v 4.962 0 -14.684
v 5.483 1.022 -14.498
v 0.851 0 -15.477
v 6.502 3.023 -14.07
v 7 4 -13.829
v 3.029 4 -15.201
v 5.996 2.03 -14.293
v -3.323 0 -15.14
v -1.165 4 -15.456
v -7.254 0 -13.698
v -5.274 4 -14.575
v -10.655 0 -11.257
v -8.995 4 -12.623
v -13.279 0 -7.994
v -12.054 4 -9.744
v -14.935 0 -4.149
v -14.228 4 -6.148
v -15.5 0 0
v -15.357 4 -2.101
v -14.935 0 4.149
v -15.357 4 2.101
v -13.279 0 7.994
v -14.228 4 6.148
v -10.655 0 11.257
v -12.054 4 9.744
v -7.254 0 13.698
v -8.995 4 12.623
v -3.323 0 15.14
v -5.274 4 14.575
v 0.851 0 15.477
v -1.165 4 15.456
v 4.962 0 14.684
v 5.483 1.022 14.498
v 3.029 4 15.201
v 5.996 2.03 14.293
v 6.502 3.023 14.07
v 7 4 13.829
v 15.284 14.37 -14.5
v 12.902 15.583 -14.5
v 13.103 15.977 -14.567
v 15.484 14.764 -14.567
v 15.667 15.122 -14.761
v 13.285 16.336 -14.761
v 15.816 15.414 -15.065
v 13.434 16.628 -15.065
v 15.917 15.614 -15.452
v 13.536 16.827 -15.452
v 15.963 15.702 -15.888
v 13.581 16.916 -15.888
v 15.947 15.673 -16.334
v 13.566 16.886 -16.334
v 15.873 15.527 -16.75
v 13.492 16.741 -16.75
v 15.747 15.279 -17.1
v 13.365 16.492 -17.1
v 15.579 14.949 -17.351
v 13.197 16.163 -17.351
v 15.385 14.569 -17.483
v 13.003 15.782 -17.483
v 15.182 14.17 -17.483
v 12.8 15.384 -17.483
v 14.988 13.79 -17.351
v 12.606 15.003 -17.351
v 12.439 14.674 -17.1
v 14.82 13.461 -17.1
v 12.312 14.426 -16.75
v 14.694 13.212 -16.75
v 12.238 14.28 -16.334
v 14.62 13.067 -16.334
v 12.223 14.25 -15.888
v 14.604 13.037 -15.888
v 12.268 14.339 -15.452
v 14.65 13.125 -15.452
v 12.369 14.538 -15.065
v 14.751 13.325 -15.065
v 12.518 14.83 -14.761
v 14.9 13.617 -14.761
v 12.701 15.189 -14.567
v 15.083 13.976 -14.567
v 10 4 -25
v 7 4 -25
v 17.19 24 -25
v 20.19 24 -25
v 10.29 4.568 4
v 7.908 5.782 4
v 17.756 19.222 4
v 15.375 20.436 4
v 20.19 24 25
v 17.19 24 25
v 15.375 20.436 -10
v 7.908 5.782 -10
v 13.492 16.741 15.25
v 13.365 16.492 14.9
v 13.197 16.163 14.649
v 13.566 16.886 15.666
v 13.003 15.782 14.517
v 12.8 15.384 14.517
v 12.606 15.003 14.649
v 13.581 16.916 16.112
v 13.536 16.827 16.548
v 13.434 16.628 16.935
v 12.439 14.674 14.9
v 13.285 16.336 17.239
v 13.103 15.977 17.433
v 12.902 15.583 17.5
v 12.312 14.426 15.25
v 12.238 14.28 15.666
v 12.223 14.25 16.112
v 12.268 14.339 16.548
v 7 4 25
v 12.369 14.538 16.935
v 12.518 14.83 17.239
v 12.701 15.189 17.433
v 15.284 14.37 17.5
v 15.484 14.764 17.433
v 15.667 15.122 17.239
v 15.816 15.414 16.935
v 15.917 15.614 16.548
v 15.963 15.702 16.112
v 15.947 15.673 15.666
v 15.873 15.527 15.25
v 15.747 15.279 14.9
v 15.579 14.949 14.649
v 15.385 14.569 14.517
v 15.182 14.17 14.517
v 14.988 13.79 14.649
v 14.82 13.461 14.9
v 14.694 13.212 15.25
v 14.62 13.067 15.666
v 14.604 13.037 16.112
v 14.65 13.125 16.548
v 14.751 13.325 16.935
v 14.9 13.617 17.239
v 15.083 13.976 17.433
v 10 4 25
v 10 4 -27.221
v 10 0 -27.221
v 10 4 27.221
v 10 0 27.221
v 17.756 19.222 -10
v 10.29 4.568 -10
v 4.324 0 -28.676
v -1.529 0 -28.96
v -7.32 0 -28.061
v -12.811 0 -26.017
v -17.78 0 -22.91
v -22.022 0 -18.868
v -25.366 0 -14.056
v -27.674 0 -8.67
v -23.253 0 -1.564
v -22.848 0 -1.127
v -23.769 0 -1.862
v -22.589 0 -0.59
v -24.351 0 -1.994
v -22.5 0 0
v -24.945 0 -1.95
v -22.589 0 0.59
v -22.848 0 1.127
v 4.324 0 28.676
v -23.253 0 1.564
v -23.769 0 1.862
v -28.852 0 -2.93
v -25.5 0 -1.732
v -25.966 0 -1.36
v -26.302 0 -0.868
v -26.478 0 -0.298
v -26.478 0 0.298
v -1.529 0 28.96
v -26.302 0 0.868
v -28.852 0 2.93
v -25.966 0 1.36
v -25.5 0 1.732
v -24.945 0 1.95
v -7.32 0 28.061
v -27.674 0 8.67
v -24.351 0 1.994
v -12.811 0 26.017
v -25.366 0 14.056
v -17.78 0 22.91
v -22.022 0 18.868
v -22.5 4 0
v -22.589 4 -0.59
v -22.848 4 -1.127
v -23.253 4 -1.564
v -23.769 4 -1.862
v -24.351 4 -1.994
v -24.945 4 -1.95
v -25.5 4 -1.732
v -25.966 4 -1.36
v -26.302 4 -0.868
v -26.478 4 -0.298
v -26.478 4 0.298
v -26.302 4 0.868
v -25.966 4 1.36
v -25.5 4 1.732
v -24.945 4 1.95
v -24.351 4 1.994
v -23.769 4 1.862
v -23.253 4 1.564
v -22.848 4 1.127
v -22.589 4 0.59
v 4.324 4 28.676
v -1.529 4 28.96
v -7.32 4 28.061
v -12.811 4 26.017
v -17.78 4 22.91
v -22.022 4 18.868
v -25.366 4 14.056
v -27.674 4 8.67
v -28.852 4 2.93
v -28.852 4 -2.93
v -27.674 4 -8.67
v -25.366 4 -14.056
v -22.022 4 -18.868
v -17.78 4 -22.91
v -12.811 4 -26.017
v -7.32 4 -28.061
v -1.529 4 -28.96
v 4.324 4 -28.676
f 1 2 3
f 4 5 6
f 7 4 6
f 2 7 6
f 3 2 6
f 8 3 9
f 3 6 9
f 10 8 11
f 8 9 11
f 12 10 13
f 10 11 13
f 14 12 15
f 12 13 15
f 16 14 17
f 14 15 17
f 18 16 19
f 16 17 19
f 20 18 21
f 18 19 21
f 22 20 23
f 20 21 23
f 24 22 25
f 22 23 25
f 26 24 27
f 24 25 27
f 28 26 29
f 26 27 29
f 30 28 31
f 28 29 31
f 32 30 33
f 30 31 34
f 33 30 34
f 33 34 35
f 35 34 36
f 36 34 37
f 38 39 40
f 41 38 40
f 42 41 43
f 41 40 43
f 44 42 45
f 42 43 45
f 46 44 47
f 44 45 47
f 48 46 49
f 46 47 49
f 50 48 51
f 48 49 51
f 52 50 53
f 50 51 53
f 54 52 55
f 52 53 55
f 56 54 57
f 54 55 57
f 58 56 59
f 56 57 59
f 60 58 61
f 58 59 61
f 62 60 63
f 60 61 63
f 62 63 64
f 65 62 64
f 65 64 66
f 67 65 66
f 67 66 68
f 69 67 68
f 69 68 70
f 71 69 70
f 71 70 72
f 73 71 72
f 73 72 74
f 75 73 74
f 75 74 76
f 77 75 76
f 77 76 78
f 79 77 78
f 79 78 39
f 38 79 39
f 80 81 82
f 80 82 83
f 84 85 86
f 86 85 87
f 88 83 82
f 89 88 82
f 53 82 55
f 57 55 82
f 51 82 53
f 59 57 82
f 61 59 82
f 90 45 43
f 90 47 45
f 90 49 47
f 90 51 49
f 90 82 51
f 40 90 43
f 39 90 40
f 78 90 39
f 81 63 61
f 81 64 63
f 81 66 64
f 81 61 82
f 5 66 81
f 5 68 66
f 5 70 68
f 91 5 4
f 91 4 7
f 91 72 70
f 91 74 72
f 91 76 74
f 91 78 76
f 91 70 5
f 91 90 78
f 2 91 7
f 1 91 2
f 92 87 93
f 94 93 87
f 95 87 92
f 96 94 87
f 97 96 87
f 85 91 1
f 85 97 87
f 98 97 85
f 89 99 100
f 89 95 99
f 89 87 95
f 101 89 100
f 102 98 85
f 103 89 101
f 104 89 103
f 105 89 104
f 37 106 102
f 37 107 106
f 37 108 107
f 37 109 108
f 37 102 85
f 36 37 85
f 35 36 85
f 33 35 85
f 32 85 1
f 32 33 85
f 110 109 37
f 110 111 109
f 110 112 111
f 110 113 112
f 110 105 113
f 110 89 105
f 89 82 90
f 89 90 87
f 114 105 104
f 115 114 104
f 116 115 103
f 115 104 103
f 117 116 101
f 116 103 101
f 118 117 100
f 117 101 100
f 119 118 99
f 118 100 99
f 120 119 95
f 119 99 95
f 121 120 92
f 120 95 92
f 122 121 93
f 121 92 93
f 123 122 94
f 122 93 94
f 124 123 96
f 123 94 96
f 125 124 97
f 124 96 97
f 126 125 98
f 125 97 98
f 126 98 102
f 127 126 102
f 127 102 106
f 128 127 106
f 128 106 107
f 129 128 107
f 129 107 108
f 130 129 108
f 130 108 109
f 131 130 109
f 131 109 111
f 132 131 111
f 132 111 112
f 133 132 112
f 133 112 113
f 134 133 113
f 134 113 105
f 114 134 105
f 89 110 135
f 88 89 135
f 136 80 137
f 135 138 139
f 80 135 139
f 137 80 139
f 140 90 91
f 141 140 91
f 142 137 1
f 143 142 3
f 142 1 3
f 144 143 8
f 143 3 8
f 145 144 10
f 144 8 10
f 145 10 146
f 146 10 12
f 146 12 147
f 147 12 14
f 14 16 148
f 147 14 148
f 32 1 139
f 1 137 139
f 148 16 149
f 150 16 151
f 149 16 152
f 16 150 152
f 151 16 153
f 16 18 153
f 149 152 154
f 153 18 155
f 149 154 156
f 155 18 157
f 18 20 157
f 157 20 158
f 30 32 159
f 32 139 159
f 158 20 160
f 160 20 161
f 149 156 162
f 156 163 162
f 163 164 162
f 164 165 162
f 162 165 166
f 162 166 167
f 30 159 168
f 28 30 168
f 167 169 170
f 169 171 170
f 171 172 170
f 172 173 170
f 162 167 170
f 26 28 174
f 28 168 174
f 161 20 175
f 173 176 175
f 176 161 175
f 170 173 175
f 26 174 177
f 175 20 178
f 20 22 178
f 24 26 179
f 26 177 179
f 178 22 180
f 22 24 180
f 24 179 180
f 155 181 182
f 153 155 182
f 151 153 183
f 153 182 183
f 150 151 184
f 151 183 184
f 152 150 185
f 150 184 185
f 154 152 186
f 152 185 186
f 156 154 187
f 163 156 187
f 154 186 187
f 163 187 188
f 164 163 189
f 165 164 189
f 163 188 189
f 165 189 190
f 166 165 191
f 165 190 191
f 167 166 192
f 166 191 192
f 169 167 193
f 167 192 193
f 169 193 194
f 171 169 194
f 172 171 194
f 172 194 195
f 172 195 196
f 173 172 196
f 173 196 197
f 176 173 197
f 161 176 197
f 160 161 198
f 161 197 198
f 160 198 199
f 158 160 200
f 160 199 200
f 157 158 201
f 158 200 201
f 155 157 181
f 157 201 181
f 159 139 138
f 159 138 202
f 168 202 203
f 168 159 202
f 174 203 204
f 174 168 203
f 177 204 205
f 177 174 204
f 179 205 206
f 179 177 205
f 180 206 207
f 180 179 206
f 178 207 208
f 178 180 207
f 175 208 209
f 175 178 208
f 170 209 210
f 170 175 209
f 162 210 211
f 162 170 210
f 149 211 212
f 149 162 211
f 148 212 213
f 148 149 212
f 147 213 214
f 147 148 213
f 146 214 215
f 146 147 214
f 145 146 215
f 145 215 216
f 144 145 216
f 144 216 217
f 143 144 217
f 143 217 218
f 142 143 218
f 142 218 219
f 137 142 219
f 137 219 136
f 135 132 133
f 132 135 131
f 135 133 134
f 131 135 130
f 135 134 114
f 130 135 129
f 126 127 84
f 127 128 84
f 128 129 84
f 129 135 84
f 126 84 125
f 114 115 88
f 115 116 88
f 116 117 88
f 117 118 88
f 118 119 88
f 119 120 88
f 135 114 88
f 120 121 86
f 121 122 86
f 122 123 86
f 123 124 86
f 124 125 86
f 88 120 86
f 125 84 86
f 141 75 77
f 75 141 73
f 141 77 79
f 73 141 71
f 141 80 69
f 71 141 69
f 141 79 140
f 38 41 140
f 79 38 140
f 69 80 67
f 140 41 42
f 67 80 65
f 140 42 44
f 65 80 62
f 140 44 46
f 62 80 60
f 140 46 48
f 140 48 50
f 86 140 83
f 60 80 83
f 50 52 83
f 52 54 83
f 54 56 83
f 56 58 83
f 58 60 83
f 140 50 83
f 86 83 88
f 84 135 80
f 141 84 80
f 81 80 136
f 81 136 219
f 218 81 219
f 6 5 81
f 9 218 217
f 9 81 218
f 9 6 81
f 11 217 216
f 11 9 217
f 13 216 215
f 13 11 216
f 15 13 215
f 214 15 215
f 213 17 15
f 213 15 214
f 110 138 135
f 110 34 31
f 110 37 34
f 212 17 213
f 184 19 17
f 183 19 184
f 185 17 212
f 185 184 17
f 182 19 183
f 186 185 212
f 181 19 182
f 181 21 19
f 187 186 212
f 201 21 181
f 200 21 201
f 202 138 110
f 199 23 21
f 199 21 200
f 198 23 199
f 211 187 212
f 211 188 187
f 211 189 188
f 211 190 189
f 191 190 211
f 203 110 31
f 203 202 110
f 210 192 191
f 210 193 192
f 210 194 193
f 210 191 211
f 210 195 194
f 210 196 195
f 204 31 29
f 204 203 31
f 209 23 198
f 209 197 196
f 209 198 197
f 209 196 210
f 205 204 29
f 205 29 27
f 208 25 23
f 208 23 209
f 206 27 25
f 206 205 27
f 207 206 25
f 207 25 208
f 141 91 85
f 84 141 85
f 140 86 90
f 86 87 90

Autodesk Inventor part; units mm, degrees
ref_plane "YZ Plane" through (0, 0, 0) normal (1, 0, 0) x (0, 1, 0)
ref_plane "XZ Plane" through (0, 0, 0) normal (0, 1, 0) x (-1, 0, 0)
ref_plane "XY Plane" through (0, 0, 0) normal (0, 0, 1) x (1, 0, 0)
sketch "Sketch1" plane through (0, 0, 0) normal (0, 1, 0) x (-1, 0, 0)
  circle A0 centre (0, 0) radius 29
  dimension "d0" = 58
extrude "Extrusion1" add sketch "Sketch1" along normal blind 4
sketch "Sketch2" plane through (0, 4, 0) normal (0, 1, 0) x (1, 0, 0)
  circle A0 centre (0, 0) radius 15.5
  dimension "d3" = 31
extrude "Extrusion2" cut sketch "Sketch2" against normal through all
sketch "Sketch3" plane through (0, 4, 0) normal (0, 1, 0) x (1, 0, 0)
  circle A0 centre (-24.5, 0) radius 2
  point P0 (0, 0)
  dimension "d6" = 24.5
  dimension "d7" = 4
extrude "Extrusion3" cut sketch "Sketch3" against normal through all
sketch "Sketch4" plane through (0, 4, 0) normal (0, 1, 0) x (1, 0, 0)
  line L0 (10, -34.3438) -> (33.4765, -34.3438)
  line L1 (33.4765, -34.3438) -> (33.4765, 39.4177)
  line L2 (33.4765, 39.4177) -> (10, 39.4177)
  line L3 (10, 39.4177) -> (10, -34.3438)
  point P0 (0, 0)
  dimension "d13" = 10
extrude "Extrusion4" cut sketch "Sketch4" against normal blind 10
sketch "Sketch5" plane through (0, 0, 0) normal (0, 0, 1) x (1, 0, 0)
  line L0 (10, 4) -> (-29, 4) projected
  line L1 (10, 4) -> (20.1905, 24)
  line L2 (10, 4) -> (32.4465, 4) construction
  line L3 (20.1905, 24) -> (17.1905, 24)
  line L4 (17.1905, 24) -> (7, 4)
  line L5 (7, 4) -> (10, 4)
  line L6 (10, 0) -> (10, 4) projected
  line L7 (10, 4) -> (10, 0)
  line L8 (7, 4) -> (4.9619, 0)
  line L9 (10, 0) -> (-15.5, 0) projected
  line L10 (4.9619, 0) -> (10, 0)
  point P0 (0, 0)
  point P1 (7, 4)
  point P2 (18.6905, 24)
  dimension "d16" = 63
  dimension "d17" = 3
  dimension "d18" = 117
  dimension "d21" = 20
extrude "Extrusion5" add sketch "Sketch5" along normal mid plane 50 contours L0 L4 L3 L1
sketch "Sketch6" plane through (7, 4, -25) normal (-0.891, 0.454, 0) x (0, 0, 1)
  line L0 (11.1707, 0) -> (38.8293, 0) projected
  line L1 (15, 2) -> (29, 2)
  line L2 (29, 2) -> (29, 18.4465)
  line L3 (29, 18.4465) -> (15, 18.4465)
  line L4 (15, 18.4465) -> (15, 2)
  line L5 (50, 22.4465) -> (0, 22.4465) projected
  point P0 (25, -6.742)
  point P1 (25, 0)
  point P2 (25, 0)
  point P3 (40, 22.4465)
  point P4 (10, 22.4465)
  dimension "d37" = 4
  dimension "d38" = 10
  dimension "d39" = 4
  dimension "d40" = 2
extrude "Extrusion6" cut sketch "Sketch6" against normal blind 46
sketch "Sketch7" plane through (7, 4, -25) normal (-0.891, 0.454, 0) x (0, 0, 1)
  circle A0 centre (9, 13) radius 1.5
  circle A1 centre (41, 13) radius 1.5
  line L0 (50, 0) -> (38.8293, 0) projected
  line L1 (11.1707, 0) -> (0, 0) projected
  ellipse E0 centre (25, -14.3007) end of major axis (27, -14.3007) minor radius 0.908 projected
  point P0 (25, -6.742)
  dimension "d29" = 3
  dimension "d30" = 3
  dimension "d31" = 13
  dimension "d32" = 13
  dimension "d46" = 16
  dimension "d47" = 16
extrude "Extrusion7" cut sketch "Sketch7" against normal blind 46 contours A0 | A1
sketch "Sketch8" plane through (0, 0, 25) normal (0, 0, 1) x (1, 0, 0)
  line L0 (10, 4) -> (10, 0) projected
  line L1 (10, 4) -> (10, 0)
  line L2 (10, 4) -> (-29, 4) projected
  line L3 (7, 4) -> (4.9619, 0)
  line L4 (10, 0) -> (-29, 0) projected
  line L5 (7, 4) -> (11.4893, 4) construction
  line L6 (4.9619, 0) -> (10, 0)
  point P0 (0, 0)
  dimension "d43" = 117
extrude "Extrusion8" add sketch "Sketch8" against normal blind 46
properties part number "Nose cam retention"
